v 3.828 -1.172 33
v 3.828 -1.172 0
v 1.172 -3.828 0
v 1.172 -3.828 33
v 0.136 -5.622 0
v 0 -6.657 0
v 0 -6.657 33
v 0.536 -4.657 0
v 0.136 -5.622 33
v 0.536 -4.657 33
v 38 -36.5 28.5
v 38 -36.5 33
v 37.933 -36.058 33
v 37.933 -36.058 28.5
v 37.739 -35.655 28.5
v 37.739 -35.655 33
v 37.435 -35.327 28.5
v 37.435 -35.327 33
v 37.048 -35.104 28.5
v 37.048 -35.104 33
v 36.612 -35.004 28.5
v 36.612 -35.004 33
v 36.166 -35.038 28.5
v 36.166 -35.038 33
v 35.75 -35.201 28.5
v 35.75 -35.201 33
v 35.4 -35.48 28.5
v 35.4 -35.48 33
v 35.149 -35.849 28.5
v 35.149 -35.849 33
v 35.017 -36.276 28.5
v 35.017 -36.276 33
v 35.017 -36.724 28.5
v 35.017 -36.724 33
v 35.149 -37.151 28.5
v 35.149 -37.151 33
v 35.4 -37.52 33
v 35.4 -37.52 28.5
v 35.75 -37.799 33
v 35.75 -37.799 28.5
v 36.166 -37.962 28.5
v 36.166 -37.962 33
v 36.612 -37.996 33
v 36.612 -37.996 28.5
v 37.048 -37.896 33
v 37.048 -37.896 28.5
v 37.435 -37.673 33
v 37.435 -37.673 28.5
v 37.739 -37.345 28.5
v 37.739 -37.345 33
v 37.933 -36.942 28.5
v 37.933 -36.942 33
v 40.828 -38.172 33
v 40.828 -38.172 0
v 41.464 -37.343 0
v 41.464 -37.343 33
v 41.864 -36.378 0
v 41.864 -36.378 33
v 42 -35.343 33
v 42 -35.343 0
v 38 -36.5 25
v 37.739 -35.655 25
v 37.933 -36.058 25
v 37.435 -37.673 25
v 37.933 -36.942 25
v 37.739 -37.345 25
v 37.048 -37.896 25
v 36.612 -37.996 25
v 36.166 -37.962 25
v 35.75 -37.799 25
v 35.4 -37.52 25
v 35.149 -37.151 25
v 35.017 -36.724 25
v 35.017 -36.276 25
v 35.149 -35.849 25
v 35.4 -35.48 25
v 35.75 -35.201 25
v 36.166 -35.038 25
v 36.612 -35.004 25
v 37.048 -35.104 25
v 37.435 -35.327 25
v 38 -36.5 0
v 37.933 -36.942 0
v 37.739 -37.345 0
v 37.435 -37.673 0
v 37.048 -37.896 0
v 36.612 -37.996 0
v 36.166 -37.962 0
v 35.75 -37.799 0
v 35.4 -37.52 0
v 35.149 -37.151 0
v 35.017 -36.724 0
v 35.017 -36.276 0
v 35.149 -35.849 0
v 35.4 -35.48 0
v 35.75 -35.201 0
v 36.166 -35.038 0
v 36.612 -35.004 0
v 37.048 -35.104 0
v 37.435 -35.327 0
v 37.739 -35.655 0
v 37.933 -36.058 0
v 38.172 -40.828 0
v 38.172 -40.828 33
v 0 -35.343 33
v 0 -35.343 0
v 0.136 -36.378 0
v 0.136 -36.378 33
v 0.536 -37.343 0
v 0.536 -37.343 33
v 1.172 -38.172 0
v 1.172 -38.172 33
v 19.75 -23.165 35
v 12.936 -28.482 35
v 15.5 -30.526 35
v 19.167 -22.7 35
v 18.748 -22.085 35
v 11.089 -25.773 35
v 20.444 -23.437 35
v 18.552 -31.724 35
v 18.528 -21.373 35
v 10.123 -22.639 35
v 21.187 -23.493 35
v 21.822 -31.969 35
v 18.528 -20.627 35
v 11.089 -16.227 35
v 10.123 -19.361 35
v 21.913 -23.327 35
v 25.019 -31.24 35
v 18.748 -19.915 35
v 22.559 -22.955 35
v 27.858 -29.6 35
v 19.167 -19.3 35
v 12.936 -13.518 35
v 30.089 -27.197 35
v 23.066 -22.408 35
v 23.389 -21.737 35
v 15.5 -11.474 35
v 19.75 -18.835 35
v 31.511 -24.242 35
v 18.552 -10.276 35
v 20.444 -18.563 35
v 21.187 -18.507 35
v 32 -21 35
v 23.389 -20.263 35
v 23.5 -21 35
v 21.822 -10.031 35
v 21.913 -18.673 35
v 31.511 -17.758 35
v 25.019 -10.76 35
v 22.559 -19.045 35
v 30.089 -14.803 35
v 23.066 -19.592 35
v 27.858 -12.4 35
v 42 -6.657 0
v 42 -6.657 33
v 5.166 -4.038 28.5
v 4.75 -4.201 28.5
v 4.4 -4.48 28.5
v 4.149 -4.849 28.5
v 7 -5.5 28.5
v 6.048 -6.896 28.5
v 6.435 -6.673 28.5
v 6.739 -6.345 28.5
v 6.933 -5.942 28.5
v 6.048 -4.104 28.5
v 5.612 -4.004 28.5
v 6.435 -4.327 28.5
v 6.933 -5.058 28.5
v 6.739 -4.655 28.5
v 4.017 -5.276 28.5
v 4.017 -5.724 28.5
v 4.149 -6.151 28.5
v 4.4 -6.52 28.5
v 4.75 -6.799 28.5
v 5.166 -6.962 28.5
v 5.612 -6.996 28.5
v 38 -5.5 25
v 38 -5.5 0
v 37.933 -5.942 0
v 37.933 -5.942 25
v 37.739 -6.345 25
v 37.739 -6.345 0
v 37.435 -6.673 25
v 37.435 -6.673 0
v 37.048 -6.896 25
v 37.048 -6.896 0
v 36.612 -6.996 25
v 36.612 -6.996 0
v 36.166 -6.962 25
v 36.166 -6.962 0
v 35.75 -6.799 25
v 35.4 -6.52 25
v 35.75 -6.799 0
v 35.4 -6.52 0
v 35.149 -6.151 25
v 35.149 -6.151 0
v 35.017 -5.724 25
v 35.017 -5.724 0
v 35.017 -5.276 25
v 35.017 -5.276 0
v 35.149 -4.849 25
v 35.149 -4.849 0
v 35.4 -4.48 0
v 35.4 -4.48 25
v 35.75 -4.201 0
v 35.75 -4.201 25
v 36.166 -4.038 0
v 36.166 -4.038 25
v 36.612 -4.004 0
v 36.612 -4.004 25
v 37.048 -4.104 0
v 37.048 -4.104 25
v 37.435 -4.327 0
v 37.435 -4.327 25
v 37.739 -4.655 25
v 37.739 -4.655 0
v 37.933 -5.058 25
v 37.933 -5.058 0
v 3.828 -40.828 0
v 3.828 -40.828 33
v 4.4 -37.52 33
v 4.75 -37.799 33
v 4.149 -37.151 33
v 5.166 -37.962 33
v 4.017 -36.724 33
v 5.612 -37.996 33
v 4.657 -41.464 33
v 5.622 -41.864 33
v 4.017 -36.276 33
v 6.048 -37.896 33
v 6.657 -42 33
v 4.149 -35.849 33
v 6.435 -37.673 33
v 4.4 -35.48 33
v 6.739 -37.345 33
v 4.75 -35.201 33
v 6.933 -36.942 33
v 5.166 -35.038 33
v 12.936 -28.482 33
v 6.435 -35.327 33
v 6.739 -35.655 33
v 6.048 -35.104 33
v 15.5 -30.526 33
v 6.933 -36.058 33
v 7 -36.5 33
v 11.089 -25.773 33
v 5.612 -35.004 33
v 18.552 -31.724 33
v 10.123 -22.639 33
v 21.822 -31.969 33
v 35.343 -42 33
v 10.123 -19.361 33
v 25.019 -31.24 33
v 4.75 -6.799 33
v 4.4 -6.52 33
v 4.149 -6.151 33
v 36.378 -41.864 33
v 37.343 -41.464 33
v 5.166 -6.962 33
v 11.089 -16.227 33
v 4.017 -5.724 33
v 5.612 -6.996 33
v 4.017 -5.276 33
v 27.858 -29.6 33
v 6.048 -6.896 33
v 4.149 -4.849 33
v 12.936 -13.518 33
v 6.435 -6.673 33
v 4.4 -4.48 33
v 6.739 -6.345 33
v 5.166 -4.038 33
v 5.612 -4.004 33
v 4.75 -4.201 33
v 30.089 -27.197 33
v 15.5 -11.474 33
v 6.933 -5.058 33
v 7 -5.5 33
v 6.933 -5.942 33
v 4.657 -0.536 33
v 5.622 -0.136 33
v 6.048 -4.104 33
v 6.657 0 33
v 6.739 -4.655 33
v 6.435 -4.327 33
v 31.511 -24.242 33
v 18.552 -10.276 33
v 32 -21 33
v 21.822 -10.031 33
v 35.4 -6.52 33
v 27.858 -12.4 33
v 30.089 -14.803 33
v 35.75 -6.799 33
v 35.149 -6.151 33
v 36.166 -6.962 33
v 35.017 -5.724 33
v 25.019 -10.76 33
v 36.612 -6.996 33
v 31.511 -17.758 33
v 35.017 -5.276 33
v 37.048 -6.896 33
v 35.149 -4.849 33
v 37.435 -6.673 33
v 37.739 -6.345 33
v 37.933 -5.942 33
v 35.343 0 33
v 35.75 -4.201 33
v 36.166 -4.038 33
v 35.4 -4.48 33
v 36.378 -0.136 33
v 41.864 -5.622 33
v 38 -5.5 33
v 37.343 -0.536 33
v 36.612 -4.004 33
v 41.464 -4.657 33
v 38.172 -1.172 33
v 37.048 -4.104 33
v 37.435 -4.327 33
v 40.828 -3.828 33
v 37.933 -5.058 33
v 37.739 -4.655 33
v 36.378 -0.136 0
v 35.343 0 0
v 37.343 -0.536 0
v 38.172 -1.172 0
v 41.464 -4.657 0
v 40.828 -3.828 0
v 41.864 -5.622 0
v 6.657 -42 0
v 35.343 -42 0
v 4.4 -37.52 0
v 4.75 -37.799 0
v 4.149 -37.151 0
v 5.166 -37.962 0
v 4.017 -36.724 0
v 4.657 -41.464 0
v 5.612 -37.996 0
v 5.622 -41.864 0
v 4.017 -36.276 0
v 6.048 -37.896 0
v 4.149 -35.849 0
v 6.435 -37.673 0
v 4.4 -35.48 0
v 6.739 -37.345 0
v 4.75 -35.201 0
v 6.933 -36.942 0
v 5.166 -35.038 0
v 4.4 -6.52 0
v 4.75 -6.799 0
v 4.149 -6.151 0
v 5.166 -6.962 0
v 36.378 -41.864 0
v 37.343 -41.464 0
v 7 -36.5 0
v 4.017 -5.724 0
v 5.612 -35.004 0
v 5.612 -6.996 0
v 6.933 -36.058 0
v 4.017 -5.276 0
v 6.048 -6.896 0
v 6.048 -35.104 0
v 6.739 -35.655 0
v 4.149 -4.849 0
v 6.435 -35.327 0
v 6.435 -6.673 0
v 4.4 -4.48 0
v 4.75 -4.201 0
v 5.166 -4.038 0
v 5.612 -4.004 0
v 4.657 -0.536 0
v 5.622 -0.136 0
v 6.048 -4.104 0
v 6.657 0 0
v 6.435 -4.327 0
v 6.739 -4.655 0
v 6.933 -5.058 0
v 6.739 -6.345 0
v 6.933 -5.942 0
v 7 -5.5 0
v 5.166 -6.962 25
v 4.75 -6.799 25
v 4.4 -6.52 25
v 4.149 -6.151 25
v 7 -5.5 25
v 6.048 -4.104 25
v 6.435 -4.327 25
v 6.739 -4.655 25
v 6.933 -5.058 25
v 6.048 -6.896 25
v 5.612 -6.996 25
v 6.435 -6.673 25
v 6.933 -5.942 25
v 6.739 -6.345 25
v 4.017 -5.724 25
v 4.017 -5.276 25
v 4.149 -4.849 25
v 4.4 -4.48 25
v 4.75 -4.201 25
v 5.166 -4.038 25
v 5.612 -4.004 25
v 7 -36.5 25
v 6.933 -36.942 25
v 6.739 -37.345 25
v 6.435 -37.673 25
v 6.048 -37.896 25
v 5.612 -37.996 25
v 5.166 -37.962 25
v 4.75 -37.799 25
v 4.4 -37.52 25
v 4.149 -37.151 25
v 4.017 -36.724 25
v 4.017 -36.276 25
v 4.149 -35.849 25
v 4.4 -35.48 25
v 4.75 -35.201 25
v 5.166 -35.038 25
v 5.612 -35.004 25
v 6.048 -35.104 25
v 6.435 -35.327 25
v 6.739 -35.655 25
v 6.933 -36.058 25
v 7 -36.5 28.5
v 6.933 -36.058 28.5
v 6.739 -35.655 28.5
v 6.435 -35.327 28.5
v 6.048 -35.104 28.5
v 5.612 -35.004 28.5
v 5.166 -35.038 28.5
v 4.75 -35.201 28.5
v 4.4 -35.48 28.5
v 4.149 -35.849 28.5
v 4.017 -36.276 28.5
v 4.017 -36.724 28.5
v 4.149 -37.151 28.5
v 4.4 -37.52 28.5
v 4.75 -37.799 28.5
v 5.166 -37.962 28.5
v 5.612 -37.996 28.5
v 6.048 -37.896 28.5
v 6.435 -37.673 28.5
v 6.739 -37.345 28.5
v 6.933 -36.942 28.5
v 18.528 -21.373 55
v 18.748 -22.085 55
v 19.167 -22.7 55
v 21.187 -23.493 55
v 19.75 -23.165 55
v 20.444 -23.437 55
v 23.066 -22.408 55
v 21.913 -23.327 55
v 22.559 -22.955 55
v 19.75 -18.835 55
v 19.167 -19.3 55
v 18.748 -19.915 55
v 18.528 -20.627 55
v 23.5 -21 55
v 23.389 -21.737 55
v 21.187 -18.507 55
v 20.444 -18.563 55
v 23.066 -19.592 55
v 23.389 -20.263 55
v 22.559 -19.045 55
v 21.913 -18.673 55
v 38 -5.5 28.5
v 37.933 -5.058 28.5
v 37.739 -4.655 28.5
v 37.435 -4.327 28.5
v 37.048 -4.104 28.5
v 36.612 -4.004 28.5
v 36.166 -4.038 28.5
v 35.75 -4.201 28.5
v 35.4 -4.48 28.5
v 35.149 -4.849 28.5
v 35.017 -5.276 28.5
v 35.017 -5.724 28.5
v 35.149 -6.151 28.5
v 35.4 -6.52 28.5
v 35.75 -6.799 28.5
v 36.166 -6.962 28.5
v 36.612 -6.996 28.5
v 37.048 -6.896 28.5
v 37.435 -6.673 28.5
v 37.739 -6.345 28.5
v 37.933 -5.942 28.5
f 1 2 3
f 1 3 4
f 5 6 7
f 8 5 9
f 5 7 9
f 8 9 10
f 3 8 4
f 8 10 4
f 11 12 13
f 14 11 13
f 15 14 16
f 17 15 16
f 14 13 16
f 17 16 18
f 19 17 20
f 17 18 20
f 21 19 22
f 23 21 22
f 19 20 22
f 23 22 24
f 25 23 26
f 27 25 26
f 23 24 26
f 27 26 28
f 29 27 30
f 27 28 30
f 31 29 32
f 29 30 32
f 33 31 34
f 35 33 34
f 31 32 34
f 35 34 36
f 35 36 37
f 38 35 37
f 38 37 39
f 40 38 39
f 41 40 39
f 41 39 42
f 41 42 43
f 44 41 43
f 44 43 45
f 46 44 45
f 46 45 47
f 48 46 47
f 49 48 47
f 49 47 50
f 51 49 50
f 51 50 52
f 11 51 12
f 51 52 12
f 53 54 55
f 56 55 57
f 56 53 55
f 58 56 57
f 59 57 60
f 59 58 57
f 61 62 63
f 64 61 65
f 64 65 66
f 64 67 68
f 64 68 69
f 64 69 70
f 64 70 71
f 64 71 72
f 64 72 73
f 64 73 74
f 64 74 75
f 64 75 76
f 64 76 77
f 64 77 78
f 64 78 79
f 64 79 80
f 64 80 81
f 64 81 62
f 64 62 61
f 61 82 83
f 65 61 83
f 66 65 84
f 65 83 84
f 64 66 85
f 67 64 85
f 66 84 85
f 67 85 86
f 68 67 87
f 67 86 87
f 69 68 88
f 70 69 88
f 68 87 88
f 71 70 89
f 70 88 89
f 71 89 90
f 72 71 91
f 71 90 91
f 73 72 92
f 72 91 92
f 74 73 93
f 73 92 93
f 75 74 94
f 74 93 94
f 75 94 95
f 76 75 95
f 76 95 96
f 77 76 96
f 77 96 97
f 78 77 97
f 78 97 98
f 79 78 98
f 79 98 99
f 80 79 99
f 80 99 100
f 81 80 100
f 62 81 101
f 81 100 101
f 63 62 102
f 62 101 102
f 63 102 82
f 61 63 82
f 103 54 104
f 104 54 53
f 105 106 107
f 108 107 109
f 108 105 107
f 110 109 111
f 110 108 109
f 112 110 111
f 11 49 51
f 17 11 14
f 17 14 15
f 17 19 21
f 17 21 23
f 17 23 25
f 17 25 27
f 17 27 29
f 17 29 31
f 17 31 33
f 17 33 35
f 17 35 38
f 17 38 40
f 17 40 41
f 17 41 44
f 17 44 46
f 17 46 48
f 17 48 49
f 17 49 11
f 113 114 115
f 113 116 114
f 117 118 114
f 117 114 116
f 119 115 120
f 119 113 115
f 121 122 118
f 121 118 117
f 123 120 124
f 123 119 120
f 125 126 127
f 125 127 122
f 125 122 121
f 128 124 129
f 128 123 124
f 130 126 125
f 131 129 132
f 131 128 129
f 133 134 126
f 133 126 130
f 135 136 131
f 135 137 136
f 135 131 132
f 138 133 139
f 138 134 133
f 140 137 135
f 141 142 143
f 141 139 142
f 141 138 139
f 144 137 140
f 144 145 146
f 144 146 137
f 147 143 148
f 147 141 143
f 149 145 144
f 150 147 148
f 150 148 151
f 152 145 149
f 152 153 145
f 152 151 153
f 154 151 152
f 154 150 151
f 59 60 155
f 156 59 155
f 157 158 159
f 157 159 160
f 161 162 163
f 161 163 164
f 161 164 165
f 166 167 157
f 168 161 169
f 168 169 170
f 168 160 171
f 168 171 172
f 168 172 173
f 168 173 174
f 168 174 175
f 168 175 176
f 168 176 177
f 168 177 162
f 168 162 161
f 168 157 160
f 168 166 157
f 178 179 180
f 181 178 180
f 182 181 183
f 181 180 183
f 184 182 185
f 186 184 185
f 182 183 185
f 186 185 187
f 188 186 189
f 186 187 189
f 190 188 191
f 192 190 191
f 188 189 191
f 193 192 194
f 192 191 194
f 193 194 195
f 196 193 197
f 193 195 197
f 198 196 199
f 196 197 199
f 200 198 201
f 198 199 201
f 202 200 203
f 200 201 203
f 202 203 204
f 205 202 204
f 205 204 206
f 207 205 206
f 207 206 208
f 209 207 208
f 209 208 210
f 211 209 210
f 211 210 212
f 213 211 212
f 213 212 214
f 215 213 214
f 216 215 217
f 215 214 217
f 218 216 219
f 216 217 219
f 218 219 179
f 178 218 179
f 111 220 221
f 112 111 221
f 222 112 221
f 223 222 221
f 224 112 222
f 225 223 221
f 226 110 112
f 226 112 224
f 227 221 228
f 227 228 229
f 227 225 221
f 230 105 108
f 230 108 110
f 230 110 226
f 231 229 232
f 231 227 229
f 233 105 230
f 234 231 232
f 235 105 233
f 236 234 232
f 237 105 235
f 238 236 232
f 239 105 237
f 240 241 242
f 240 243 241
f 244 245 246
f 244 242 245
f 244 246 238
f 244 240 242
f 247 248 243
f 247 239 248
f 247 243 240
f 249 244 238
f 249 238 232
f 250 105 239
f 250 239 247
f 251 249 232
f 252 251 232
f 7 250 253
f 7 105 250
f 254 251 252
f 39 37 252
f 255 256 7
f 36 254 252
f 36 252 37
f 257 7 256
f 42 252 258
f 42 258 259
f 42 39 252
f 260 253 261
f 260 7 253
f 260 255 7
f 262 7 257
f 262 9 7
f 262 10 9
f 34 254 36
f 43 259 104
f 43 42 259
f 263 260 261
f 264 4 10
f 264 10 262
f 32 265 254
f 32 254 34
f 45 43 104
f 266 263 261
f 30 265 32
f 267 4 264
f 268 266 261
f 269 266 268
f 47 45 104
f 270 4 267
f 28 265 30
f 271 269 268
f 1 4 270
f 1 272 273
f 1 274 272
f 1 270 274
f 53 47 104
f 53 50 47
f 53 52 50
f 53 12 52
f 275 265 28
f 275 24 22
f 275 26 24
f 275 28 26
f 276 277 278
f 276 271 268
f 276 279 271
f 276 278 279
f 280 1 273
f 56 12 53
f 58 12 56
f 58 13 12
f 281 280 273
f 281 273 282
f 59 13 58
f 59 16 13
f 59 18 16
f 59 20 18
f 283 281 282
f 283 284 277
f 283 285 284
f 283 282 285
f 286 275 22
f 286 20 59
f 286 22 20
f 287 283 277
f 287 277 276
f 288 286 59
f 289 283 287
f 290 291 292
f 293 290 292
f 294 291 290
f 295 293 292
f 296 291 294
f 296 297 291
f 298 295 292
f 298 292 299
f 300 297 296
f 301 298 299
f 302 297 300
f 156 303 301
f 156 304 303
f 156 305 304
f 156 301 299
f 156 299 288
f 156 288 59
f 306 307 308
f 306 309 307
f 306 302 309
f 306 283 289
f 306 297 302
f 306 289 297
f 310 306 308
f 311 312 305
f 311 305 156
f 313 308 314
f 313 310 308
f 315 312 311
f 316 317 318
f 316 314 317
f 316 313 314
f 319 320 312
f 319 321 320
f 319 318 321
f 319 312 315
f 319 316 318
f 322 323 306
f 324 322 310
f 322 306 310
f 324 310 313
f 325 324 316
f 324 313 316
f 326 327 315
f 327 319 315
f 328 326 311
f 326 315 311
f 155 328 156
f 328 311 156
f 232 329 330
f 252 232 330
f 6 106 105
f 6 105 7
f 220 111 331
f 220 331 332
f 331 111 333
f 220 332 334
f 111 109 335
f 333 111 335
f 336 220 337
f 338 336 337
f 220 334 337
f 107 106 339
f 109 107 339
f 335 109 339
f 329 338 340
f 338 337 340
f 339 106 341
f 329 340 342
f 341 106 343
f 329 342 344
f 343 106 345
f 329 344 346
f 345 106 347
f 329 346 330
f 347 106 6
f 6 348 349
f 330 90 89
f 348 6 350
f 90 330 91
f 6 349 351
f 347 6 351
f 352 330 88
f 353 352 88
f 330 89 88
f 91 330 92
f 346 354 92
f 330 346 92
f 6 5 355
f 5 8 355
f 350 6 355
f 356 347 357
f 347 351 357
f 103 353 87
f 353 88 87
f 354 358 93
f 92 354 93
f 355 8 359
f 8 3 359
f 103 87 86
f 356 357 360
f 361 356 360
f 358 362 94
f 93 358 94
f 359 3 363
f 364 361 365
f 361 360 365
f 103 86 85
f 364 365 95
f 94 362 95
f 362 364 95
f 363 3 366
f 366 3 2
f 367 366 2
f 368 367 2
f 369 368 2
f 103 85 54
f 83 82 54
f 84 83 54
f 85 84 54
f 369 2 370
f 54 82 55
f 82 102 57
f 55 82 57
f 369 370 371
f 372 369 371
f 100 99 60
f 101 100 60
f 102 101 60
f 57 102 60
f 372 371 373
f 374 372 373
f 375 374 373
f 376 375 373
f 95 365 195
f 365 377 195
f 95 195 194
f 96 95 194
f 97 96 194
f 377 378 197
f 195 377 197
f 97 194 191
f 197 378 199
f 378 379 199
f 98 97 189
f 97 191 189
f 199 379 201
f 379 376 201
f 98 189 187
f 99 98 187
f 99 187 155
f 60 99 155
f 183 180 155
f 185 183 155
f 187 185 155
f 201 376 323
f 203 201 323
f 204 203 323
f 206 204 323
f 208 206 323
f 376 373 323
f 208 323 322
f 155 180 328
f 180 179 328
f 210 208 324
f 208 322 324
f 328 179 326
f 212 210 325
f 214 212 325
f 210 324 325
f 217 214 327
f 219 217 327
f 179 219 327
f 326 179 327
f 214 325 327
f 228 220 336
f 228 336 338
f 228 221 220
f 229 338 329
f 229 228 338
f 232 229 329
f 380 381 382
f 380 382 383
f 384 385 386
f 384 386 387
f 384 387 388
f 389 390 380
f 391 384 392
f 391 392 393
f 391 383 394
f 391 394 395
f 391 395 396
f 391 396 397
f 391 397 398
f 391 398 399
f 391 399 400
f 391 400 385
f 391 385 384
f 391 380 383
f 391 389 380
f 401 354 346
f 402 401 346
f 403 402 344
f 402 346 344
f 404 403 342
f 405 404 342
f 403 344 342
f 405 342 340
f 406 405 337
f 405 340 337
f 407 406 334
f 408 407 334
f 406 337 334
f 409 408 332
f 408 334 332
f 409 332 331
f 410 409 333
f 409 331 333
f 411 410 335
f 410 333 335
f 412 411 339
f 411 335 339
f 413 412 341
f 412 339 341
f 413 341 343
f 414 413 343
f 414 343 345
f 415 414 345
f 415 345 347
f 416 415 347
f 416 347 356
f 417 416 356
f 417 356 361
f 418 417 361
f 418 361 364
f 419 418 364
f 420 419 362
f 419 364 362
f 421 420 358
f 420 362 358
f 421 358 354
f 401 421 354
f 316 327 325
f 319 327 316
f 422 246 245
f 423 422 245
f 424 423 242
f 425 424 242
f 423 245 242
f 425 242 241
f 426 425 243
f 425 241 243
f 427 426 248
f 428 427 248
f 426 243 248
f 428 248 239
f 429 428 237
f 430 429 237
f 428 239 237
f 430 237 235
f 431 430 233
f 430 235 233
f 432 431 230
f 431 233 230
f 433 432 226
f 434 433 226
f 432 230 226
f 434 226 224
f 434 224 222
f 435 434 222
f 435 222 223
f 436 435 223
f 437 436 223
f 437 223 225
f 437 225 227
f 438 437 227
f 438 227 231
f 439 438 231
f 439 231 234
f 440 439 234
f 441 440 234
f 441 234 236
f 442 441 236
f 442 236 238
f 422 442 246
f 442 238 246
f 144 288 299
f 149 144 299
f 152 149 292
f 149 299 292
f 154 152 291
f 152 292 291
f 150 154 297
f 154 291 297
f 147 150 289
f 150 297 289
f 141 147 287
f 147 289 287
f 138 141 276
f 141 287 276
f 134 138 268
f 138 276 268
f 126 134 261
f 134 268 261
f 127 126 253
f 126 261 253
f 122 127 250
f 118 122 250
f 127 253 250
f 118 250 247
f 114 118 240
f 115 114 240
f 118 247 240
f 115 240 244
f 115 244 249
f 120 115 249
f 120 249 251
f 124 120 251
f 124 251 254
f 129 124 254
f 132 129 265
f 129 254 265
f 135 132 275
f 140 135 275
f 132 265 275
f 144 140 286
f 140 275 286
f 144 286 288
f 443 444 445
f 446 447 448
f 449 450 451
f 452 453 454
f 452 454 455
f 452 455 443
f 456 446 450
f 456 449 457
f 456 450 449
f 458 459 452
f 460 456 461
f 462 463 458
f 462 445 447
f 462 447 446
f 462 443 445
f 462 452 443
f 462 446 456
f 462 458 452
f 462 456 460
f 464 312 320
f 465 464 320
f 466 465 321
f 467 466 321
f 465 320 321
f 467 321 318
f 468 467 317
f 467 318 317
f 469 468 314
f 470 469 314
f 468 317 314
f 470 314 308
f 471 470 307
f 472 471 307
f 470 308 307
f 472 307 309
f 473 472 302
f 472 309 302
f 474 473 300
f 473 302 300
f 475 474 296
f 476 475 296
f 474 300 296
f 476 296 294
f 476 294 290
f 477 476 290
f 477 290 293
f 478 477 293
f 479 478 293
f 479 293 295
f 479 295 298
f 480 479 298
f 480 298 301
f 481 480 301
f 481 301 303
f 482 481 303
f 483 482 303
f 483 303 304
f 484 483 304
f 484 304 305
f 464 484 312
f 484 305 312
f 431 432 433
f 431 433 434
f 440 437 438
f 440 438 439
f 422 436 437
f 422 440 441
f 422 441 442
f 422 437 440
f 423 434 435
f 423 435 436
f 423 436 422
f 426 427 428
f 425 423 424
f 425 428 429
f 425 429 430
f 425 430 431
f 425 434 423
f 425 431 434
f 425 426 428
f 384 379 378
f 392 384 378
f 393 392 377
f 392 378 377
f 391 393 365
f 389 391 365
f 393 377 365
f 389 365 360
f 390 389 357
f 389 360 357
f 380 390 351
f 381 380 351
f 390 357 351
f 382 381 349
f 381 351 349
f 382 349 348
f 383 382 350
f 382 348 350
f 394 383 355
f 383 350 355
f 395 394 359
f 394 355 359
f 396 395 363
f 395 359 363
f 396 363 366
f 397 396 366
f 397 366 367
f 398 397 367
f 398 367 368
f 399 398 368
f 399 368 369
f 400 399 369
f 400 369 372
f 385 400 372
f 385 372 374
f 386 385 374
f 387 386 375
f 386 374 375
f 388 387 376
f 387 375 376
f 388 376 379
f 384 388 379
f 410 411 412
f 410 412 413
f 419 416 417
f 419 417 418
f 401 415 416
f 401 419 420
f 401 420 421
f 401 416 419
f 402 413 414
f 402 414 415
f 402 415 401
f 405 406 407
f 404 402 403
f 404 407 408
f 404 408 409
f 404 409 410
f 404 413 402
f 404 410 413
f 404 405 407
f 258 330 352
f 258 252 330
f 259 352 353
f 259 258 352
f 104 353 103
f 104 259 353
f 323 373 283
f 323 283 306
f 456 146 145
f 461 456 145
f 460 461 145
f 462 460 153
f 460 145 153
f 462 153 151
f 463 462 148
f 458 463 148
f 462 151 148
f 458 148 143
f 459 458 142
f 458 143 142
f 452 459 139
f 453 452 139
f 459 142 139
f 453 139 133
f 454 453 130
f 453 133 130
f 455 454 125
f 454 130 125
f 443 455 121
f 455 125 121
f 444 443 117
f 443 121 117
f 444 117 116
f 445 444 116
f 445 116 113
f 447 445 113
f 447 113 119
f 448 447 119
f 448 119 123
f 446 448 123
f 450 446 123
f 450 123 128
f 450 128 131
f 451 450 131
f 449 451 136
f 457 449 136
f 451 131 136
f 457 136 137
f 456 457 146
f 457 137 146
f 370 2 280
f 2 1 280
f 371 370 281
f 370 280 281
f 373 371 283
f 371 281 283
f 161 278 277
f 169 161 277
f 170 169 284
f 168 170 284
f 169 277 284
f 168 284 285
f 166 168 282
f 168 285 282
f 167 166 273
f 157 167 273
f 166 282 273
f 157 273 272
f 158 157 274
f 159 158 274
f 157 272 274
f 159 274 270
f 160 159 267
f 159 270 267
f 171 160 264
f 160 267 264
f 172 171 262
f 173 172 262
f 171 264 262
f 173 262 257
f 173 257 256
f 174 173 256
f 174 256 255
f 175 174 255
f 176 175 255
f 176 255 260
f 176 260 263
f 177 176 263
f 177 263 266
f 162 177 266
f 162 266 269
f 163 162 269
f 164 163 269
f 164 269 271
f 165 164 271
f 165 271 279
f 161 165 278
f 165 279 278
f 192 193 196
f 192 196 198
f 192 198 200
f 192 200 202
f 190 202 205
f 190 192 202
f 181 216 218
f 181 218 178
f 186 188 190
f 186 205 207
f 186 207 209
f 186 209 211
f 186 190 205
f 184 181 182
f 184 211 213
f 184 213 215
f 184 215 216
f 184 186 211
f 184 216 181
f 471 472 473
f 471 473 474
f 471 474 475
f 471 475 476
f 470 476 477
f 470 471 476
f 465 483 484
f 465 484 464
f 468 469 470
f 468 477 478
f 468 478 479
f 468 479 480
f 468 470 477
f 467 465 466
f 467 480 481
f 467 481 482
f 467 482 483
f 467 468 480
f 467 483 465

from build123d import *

# Parameters (mm, degrees)
F0_W      = 42
F0_H      = 42
F1_DEPTH  = 33
F2_R      = 11
F3_DEPTH  = 2
F4_R      = 2.5
F5_DEPTH  = 20
F6_R      = 1.5
F7_DEPTH  = 4.5
F8_SIZE   = 5
F9_R      = 4
F10_R     = 1.5
F11_DEPTH = 25


with BuildPart() as f1:
    # F0 (on Top) → F1 (new body)
    with BuildSketch(Plane.XY):
        with Locations((21, -21)):
            Rectangle(F0_W, F0_H)
    extrude(amount=F1_DEPTH)

    # F2 (on face) → F3 (join)
    with BuildSketch(Plane.XY.offset(33)):
        with Locations((21, -21)):
            Circle(F2_R)
    extrude(amount=F3_DEPTH)

    # F4 (on face) → F5 (join)
    with BuildSketch(Plane.XY.offset(35)):
        with Locations((21, -21)):
            Circle(F4_R)
    extrude(amount=F5_DEPTH)

    # F6 (on face) → F7 (cut)
    with BuildSketch(Plane.XY.offset(33)):
        with Locations((5.5, -5.5)):
            Circle(F6_R)
        with Locations((36.5, -5.5)):
            Circle(F6_R)
        with Locations((36.5, -36.5)):
            Circle(F6_R)
        with Locations((5.5, -36.5)):
            Circle(F6_R)
    extrude(amount=-F7_DEPTH, mode=Mode.SUBTRACT)

    # F8
    f8_edges = [f1.edges().sort_by_distance(p)[0] for p in [
        (42, 0, 16.5),
        (42, -42, 16.5),
        (0, -42, 16.5),
        (0, 0, 16.5),
    ]]
    chamfer(f8_edges, length=F8_SIZE)

    # F9
    f9_edges = [f1.edges().sort_by_distance(p)[0] for p in [
        (0, -5, 16.5),
        (5, 0, 16.5),
        (0, -37, 16.5),
        (5, -42, 16.5),
        (37, -42, 16.5),
        (42, -37, 16.5),
        (37, 0, 16.5),
        (42, -5, 16.5),
    ]]
    fillet(f9_edges, radius=F9_R)

    # F10 (on face) → F11 (cut)
    with BuildSketch(Plane(origin=(0, 0, 0), x_dir=(1, 0, 0), z_dir=(0, 0, -1))):
        with Locations((36.5, 36.5)):
            Circle(F10_R)
        with Locations((5.5, 36.5)):
            Circle(F10_R)
        with Locations((5.5, 5.5)):
            Circle(F10_R)
        with Locations((36.5, 5.5)):
            Circle(F10_R)
    extrude(amount=-F11_DEPTH, mode=Mode.SUBTRACT)


solid = f1.part
